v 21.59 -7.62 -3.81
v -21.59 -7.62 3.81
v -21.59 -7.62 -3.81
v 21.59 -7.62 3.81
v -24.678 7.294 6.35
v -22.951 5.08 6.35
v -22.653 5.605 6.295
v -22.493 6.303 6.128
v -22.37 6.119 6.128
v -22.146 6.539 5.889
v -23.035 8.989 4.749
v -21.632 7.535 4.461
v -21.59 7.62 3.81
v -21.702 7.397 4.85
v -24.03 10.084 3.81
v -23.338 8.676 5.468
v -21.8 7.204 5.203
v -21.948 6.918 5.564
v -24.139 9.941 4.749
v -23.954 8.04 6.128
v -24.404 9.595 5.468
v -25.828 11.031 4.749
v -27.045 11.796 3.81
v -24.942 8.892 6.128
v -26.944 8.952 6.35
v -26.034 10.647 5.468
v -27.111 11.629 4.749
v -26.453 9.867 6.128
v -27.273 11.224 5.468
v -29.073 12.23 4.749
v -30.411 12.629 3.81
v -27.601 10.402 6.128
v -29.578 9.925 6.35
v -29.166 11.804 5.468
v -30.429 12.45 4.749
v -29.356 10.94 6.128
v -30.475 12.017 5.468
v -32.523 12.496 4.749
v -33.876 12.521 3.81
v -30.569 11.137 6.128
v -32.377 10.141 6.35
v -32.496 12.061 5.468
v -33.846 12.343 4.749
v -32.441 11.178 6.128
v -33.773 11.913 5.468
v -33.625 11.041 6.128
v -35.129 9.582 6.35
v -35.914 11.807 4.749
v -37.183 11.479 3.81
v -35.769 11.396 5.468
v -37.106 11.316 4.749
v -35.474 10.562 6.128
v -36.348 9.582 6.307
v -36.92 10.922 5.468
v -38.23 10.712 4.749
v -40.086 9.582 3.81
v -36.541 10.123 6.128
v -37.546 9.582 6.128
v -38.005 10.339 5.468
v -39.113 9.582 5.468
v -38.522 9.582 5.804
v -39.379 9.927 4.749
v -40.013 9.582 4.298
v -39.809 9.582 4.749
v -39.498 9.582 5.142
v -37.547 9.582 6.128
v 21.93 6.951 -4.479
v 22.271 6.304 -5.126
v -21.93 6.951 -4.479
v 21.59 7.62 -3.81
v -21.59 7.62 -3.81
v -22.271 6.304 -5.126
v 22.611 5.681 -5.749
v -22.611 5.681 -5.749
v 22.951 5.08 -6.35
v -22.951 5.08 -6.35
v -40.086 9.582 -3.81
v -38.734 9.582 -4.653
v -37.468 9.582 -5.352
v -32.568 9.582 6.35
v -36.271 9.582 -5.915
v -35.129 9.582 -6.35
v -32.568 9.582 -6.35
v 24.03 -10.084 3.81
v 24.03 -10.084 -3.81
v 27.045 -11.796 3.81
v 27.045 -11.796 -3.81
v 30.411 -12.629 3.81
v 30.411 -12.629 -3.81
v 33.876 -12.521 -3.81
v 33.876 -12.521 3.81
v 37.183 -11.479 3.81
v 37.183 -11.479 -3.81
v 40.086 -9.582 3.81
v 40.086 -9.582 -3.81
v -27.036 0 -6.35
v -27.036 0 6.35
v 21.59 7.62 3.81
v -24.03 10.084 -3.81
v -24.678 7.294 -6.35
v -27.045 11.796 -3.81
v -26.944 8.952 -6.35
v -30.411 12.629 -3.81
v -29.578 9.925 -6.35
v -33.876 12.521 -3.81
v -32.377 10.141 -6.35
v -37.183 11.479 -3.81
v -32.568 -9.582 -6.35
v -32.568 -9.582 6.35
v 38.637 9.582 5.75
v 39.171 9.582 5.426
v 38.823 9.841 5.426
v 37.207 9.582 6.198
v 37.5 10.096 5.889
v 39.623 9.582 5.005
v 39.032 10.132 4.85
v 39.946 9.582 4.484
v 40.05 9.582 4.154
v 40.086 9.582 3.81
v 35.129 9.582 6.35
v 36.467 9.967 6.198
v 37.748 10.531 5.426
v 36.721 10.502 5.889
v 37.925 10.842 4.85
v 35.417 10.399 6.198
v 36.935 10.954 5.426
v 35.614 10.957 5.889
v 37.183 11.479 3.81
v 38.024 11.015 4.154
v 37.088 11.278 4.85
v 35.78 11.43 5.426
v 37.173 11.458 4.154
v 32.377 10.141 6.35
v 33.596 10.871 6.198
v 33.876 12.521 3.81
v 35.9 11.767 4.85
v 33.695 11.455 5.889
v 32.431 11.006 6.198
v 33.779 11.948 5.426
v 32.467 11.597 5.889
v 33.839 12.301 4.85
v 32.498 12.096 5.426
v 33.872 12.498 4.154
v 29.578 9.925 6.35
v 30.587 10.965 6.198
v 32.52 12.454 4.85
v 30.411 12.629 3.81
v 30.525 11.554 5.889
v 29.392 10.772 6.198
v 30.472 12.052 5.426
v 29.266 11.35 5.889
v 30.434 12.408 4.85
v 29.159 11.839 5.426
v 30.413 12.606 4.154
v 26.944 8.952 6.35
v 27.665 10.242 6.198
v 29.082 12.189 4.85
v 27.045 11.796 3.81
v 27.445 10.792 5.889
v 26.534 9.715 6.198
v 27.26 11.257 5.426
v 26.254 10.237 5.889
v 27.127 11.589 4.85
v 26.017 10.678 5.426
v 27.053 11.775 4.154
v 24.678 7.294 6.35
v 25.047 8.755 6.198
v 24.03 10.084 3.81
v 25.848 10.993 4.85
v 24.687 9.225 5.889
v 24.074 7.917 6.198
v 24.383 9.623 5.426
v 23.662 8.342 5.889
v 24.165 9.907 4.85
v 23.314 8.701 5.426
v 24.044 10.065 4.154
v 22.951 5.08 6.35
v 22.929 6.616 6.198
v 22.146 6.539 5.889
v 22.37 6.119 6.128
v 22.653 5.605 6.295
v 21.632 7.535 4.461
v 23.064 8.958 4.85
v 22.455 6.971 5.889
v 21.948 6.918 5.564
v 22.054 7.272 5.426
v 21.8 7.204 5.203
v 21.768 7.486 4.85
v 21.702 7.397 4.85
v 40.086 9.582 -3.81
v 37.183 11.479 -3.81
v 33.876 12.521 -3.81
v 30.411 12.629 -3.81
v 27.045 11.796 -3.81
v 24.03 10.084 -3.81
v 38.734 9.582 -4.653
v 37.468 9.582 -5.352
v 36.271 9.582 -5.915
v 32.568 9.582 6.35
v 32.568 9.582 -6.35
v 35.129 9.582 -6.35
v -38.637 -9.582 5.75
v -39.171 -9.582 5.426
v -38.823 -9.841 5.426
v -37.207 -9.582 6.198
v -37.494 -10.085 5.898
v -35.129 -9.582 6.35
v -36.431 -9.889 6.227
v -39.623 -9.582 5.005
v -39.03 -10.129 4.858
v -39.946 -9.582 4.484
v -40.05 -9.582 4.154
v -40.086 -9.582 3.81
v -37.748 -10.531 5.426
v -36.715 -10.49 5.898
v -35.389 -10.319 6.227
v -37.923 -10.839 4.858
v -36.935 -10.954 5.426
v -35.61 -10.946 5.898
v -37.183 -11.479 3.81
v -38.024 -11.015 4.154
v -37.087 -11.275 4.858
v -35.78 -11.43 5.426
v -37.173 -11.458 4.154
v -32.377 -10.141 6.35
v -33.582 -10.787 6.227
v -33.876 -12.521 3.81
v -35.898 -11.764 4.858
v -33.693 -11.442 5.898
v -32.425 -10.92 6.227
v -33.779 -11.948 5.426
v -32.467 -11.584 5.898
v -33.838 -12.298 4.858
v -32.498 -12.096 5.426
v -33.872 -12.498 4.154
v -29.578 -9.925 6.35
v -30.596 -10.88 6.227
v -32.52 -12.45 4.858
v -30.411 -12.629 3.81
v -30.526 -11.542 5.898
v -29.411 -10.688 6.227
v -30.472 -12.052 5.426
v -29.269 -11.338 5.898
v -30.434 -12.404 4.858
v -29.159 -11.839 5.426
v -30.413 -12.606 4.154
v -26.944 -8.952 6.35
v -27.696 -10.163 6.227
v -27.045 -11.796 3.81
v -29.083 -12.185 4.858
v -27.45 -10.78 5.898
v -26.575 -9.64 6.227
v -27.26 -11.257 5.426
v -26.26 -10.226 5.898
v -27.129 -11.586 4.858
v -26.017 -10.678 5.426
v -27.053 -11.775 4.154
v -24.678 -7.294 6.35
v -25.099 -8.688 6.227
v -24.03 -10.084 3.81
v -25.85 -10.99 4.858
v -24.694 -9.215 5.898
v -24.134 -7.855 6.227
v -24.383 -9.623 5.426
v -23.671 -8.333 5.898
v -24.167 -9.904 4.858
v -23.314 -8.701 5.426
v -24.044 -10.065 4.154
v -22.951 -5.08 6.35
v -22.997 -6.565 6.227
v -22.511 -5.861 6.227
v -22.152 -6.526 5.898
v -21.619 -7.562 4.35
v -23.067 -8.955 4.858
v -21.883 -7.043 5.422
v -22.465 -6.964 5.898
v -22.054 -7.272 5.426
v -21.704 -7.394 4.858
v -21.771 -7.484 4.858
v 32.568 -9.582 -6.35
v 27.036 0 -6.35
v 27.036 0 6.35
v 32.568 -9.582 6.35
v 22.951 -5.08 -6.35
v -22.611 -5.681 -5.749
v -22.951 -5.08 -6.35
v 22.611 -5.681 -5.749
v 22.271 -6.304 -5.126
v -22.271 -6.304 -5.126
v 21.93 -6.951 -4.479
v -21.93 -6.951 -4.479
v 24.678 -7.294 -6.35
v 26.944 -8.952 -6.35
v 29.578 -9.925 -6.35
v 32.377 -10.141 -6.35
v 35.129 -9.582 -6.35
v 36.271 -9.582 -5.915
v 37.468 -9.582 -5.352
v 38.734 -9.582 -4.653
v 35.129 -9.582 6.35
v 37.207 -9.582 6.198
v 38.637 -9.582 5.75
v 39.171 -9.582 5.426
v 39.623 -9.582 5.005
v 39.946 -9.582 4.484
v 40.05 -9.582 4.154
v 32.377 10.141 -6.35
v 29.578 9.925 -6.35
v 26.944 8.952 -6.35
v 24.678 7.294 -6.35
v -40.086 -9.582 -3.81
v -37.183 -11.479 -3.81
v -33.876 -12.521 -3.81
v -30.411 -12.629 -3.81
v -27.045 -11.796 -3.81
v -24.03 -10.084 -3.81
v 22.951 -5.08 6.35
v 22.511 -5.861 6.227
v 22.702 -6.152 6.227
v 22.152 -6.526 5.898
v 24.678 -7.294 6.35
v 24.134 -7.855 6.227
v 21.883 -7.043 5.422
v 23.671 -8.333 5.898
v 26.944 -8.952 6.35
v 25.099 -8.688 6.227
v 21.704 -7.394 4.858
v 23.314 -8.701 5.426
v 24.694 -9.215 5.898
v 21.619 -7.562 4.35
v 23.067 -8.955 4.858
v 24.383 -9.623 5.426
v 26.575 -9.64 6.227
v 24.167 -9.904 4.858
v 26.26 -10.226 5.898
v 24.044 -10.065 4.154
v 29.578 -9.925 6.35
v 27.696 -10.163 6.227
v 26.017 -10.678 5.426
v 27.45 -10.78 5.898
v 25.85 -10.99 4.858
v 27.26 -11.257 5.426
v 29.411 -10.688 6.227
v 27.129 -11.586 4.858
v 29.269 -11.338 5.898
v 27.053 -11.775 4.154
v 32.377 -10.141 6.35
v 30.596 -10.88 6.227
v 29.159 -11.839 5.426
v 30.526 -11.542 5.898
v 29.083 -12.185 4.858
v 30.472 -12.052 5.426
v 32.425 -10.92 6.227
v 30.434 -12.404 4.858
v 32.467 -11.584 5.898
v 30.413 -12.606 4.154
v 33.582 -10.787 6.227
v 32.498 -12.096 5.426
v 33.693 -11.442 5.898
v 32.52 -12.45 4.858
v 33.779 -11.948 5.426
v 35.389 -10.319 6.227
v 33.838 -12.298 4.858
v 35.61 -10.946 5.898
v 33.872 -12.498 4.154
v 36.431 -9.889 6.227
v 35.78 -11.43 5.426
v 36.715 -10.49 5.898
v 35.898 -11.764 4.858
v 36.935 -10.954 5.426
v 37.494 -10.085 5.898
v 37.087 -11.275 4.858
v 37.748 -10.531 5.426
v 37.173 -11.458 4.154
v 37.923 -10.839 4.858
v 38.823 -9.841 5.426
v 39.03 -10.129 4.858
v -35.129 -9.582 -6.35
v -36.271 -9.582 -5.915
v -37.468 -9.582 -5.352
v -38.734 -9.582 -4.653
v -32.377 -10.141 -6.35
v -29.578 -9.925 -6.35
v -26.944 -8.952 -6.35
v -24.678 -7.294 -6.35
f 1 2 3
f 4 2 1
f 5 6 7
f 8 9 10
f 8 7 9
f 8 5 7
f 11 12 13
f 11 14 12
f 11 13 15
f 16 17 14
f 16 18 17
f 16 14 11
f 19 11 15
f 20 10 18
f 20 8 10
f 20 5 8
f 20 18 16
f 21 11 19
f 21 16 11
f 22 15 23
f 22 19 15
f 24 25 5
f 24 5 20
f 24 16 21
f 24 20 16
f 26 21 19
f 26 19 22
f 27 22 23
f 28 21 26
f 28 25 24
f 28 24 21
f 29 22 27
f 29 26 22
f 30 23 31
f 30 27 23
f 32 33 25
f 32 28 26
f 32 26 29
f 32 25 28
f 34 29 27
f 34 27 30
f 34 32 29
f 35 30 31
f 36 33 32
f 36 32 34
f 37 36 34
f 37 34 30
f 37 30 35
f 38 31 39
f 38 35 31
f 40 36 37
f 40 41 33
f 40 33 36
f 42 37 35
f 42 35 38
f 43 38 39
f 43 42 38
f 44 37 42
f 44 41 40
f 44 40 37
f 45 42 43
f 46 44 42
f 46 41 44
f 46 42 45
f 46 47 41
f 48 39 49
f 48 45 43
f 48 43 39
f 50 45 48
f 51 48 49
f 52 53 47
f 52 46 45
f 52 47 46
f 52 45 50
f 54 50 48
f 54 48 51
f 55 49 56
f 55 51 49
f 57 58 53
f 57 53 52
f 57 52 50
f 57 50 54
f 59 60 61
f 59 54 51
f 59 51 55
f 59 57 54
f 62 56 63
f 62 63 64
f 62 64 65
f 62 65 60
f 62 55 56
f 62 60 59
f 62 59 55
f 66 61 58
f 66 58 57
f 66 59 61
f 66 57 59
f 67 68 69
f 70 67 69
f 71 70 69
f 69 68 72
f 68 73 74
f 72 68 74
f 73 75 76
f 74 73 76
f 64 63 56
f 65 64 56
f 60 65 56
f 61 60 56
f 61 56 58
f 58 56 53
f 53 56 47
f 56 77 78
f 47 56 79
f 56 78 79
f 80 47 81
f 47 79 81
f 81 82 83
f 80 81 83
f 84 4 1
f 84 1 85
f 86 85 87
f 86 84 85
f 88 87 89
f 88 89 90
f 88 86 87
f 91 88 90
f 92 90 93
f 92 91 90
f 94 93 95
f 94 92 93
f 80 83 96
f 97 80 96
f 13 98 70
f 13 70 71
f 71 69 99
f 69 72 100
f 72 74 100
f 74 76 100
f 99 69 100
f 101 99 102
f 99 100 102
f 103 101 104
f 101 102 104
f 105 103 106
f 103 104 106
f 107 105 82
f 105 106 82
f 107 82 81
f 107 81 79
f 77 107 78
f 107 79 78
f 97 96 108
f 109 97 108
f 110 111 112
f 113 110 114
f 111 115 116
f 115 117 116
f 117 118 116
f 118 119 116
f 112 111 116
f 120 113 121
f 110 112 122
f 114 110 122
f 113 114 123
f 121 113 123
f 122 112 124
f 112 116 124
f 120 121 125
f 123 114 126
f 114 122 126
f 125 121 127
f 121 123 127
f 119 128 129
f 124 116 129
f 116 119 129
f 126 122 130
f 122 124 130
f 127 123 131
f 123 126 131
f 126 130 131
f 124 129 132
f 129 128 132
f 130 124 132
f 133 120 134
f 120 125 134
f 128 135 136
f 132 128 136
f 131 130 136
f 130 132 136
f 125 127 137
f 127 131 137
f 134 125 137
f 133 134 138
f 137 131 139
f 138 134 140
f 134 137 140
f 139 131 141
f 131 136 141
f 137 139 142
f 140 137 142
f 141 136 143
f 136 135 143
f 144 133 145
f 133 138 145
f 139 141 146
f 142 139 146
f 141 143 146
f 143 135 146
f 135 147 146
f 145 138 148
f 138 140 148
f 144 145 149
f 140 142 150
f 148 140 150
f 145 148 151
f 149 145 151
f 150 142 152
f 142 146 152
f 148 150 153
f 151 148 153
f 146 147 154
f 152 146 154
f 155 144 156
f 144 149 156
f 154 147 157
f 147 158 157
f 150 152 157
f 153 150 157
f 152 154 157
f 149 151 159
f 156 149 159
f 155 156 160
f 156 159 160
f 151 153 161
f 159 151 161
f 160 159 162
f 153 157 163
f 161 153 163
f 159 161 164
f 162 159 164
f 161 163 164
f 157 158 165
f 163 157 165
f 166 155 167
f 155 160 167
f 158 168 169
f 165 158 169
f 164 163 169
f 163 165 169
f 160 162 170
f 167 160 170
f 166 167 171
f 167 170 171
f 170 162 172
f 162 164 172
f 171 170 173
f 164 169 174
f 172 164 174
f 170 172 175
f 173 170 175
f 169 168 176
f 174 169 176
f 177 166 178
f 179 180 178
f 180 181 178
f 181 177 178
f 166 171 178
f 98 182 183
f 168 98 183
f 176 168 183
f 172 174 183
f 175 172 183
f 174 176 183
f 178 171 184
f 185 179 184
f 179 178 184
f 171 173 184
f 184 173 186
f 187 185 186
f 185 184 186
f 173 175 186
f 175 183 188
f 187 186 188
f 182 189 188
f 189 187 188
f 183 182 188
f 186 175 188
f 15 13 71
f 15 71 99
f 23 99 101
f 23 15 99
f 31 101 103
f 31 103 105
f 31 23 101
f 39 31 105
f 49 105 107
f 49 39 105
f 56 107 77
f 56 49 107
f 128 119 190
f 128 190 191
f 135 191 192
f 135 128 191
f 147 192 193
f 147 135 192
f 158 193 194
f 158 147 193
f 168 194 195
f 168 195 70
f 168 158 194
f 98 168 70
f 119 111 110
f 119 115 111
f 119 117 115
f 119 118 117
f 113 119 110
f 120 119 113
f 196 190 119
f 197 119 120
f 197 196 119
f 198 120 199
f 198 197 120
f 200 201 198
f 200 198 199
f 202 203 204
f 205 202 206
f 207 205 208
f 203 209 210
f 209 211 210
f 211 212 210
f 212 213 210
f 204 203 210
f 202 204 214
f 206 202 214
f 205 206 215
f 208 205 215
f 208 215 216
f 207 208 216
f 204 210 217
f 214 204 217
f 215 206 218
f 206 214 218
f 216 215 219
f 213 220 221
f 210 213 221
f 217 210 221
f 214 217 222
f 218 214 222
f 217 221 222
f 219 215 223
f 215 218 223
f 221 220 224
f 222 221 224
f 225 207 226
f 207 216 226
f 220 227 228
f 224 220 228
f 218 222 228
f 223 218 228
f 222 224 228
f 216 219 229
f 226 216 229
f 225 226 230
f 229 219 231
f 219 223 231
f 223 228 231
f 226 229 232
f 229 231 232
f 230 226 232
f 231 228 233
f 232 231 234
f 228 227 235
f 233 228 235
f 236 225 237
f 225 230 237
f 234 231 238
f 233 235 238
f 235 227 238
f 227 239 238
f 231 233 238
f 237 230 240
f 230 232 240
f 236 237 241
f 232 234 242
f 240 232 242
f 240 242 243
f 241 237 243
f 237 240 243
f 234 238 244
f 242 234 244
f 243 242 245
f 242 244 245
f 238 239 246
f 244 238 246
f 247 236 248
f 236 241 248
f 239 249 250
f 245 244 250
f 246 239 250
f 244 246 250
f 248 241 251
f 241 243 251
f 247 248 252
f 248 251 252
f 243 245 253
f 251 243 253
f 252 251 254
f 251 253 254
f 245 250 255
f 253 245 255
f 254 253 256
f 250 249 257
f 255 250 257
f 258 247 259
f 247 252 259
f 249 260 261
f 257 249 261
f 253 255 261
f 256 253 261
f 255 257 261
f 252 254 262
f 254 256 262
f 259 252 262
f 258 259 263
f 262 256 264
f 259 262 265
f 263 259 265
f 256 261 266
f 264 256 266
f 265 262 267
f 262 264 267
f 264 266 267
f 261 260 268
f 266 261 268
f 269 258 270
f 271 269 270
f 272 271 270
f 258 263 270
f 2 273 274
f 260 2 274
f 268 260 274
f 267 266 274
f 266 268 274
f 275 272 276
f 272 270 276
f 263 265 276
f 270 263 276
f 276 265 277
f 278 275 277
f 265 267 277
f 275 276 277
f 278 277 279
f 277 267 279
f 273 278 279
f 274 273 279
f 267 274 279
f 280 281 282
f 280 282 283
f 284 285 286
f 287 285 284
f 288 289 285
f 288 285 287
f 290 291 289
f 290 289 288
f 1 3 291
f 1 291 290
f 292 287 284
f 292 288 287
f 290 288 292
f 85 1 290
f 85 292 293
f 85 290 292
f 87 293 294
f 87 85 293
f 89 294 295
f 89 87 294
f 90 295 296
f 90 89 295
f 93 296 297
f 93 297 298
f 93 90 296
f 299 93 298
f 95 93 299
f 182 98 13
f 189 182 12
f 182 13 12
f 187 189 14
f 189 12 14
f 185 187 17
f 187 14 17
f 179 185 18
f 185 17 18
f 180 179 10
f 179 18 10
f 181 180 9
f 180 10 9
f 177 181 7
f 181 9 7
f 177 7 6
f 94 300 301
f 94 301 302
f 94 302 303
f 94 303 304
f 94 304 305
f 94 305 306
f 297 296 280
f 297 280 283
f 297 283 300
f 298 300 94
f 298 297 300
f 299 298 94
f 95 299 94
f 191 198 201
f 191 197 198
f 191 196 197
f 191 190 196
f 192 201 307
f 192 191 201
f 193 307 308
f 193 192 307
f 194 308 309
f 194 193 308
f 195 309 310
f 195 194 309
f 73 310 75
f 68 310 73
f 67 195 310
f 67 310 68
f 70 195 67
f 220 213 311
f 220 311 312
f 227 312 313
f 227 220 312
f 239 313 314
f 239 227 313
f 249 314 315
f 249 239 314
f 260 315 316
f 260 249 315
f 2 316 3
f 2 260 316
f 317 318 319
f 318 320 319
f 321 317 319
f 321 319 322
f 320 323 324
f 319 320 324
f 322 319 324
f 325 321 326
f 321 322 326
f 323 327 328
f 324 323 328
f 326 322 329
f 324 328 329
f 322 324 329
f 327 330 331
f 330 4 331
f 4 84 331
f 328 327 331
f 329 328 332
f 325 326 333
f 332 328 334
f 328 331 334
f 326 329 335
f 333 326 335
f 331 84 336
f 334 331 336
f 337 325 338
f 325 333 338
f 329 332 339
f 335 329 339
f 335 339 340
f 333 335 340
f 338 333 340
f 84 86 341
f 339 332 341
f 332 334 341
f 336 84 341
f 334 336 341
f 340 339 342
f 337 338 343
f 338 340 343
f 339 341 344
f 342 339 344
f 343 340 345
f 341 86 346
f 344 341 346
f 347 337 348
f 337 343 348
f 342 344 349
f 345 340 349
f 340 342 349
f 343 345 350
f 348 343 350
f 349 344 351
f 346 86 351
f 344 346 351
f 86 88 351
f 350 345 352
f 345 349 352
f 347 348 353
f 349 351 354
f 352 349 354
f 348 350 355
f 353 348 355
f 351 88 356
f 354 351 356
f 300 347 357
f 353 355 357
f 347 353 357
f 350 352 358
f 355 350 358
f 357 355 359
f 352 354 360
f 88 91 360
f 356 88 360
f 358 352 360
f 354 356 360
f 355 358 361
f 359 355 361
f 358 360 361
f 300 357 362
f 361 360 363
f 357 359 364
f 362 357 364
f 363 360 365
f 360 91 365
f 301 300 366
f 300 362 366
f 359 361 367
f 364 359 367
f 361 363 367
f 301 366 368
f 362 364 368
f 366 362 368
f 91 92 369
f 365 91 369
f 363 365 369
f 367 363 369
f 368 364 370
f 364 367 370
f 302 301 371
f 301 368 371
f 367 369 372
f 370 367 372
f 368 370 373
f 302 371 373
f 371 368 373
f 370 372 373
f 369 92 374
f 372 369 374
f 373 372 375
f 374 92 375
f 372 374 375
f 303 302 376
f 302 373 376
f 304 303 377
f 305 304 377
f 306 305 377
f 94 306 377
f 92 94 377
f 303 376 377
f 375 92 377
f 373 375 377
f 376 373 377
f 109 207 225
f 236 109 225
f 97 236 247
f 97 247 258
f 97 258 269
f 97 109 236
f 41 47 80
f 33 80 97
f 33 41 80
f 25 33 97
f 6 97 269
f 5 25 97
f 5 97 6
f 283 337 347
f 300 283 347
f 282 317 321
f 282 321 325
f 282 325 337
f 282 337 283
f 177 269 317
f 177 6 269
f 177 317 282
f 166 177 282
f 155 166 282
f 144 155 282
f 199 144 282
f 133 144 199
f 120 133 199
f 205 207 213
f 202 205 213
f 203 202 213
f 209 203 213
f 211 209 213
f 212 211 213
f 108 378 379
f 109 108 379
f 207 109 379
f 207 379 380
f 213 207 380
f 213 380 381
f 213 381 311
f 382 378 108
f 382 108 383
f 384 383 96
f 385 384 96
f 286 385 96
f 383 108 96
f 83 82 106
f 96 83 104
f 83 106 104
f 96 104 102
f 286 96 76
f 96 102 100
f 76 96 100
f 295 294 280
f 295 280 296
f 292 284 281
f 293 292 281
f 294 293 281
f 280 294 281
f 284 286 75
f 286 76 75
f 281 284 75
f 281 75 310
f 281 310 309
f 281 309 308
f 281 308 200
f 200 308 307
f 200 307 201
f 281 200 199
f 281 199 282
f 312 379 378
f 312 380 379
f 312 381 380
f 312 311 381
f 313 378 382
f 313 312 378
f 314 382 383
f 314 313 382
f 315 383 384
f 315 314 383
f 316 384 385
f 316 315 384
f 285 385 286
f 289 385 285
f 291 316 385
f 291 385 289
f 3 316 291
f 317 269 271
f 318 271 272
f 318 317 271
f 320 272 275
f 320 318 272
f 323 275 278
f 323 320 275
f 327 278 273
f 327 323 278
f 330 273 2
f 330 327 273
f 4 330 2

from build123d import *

# Parameters (mm, degrees)
F1_DEPTH = 6.35
F3_DEPTH = 12.701
F6_R     = 2.54
F7_SIZE  = 2.54


with BuildPart() as f1:
    # F0 (on Top) → F1 (new body, symmetric)
    with BuildSketch(Plane.XY):
        with BuildLine():
            Line((21.59, 7.62), (-21.59, 7.62))
            ThreePointArc((-21.59, 7.62), (-44.45, 0), (-21.59, -7.62))
            Line((-21.59, -7.62), (21.59, -7.62))
            ThreePointArc((21.59, -7.62), (44.45, 0), (21.59, 7.62))
        make_face()
    extrude(amount=F1_DEPTH, both=True)

    # F4: F3 across plane


with BuildPart() as f3:
    # F2 (on face) → F3 (new body, through all)
    with BuildSketch(Plane(origin=(0, 0, -6.35), x_dir=(1, 0, 0), z_dir=(0, 0, -1))):
        Polygon((-43.632001, 9.581707), (-49.164003, 0), (-43.632001, -9.581707), (-32.567999, -9.581707), (-27.035997, 0), (-32.567999, 9.581707), align=None)
    extrude(amount=-F3_DEPTH)


with BuildPart() as f1_1:
    add(f1.part)
    add(f3.part.mirror(Plane.YZ), mode=Mode.SUBTRACT)

    # F5: cut F3
    add(f3.part, mode=Mode.SUBTRACT)

    # F6
    f6_edges = [f1_1.edges().sort_by_distance(p)[0] for p in [
        (0, -7.62, 6.35),
        (-30.410502, 12.629162, 6.35),
        (-30.410502, -12.629162, 6.35),
        (0, 7.62, 6.35),
        (30.410502, -12.629162, 6.35),
        (30.410502, 12.629162, 6.35),
    ]]
    fillet(f6_edges, radius=F6_R)

    # F7
    f7_edges = [f1_1.edges().sort_by_distance(p)[0] for p in [
        (30.410502, -12.629162, -6.35),
        (30.410502, 12.629162, -6.35),
        (0, -7.62, -6.35),
        (0, 7.62, -6.35),
        (-30.410502, 12.629162, -6.35),
        (-30.410502, -12.629162, -6.35),
    ]]
    chamfer(f7_edges, length=F7_SIZE)


solid = f1_1.part
